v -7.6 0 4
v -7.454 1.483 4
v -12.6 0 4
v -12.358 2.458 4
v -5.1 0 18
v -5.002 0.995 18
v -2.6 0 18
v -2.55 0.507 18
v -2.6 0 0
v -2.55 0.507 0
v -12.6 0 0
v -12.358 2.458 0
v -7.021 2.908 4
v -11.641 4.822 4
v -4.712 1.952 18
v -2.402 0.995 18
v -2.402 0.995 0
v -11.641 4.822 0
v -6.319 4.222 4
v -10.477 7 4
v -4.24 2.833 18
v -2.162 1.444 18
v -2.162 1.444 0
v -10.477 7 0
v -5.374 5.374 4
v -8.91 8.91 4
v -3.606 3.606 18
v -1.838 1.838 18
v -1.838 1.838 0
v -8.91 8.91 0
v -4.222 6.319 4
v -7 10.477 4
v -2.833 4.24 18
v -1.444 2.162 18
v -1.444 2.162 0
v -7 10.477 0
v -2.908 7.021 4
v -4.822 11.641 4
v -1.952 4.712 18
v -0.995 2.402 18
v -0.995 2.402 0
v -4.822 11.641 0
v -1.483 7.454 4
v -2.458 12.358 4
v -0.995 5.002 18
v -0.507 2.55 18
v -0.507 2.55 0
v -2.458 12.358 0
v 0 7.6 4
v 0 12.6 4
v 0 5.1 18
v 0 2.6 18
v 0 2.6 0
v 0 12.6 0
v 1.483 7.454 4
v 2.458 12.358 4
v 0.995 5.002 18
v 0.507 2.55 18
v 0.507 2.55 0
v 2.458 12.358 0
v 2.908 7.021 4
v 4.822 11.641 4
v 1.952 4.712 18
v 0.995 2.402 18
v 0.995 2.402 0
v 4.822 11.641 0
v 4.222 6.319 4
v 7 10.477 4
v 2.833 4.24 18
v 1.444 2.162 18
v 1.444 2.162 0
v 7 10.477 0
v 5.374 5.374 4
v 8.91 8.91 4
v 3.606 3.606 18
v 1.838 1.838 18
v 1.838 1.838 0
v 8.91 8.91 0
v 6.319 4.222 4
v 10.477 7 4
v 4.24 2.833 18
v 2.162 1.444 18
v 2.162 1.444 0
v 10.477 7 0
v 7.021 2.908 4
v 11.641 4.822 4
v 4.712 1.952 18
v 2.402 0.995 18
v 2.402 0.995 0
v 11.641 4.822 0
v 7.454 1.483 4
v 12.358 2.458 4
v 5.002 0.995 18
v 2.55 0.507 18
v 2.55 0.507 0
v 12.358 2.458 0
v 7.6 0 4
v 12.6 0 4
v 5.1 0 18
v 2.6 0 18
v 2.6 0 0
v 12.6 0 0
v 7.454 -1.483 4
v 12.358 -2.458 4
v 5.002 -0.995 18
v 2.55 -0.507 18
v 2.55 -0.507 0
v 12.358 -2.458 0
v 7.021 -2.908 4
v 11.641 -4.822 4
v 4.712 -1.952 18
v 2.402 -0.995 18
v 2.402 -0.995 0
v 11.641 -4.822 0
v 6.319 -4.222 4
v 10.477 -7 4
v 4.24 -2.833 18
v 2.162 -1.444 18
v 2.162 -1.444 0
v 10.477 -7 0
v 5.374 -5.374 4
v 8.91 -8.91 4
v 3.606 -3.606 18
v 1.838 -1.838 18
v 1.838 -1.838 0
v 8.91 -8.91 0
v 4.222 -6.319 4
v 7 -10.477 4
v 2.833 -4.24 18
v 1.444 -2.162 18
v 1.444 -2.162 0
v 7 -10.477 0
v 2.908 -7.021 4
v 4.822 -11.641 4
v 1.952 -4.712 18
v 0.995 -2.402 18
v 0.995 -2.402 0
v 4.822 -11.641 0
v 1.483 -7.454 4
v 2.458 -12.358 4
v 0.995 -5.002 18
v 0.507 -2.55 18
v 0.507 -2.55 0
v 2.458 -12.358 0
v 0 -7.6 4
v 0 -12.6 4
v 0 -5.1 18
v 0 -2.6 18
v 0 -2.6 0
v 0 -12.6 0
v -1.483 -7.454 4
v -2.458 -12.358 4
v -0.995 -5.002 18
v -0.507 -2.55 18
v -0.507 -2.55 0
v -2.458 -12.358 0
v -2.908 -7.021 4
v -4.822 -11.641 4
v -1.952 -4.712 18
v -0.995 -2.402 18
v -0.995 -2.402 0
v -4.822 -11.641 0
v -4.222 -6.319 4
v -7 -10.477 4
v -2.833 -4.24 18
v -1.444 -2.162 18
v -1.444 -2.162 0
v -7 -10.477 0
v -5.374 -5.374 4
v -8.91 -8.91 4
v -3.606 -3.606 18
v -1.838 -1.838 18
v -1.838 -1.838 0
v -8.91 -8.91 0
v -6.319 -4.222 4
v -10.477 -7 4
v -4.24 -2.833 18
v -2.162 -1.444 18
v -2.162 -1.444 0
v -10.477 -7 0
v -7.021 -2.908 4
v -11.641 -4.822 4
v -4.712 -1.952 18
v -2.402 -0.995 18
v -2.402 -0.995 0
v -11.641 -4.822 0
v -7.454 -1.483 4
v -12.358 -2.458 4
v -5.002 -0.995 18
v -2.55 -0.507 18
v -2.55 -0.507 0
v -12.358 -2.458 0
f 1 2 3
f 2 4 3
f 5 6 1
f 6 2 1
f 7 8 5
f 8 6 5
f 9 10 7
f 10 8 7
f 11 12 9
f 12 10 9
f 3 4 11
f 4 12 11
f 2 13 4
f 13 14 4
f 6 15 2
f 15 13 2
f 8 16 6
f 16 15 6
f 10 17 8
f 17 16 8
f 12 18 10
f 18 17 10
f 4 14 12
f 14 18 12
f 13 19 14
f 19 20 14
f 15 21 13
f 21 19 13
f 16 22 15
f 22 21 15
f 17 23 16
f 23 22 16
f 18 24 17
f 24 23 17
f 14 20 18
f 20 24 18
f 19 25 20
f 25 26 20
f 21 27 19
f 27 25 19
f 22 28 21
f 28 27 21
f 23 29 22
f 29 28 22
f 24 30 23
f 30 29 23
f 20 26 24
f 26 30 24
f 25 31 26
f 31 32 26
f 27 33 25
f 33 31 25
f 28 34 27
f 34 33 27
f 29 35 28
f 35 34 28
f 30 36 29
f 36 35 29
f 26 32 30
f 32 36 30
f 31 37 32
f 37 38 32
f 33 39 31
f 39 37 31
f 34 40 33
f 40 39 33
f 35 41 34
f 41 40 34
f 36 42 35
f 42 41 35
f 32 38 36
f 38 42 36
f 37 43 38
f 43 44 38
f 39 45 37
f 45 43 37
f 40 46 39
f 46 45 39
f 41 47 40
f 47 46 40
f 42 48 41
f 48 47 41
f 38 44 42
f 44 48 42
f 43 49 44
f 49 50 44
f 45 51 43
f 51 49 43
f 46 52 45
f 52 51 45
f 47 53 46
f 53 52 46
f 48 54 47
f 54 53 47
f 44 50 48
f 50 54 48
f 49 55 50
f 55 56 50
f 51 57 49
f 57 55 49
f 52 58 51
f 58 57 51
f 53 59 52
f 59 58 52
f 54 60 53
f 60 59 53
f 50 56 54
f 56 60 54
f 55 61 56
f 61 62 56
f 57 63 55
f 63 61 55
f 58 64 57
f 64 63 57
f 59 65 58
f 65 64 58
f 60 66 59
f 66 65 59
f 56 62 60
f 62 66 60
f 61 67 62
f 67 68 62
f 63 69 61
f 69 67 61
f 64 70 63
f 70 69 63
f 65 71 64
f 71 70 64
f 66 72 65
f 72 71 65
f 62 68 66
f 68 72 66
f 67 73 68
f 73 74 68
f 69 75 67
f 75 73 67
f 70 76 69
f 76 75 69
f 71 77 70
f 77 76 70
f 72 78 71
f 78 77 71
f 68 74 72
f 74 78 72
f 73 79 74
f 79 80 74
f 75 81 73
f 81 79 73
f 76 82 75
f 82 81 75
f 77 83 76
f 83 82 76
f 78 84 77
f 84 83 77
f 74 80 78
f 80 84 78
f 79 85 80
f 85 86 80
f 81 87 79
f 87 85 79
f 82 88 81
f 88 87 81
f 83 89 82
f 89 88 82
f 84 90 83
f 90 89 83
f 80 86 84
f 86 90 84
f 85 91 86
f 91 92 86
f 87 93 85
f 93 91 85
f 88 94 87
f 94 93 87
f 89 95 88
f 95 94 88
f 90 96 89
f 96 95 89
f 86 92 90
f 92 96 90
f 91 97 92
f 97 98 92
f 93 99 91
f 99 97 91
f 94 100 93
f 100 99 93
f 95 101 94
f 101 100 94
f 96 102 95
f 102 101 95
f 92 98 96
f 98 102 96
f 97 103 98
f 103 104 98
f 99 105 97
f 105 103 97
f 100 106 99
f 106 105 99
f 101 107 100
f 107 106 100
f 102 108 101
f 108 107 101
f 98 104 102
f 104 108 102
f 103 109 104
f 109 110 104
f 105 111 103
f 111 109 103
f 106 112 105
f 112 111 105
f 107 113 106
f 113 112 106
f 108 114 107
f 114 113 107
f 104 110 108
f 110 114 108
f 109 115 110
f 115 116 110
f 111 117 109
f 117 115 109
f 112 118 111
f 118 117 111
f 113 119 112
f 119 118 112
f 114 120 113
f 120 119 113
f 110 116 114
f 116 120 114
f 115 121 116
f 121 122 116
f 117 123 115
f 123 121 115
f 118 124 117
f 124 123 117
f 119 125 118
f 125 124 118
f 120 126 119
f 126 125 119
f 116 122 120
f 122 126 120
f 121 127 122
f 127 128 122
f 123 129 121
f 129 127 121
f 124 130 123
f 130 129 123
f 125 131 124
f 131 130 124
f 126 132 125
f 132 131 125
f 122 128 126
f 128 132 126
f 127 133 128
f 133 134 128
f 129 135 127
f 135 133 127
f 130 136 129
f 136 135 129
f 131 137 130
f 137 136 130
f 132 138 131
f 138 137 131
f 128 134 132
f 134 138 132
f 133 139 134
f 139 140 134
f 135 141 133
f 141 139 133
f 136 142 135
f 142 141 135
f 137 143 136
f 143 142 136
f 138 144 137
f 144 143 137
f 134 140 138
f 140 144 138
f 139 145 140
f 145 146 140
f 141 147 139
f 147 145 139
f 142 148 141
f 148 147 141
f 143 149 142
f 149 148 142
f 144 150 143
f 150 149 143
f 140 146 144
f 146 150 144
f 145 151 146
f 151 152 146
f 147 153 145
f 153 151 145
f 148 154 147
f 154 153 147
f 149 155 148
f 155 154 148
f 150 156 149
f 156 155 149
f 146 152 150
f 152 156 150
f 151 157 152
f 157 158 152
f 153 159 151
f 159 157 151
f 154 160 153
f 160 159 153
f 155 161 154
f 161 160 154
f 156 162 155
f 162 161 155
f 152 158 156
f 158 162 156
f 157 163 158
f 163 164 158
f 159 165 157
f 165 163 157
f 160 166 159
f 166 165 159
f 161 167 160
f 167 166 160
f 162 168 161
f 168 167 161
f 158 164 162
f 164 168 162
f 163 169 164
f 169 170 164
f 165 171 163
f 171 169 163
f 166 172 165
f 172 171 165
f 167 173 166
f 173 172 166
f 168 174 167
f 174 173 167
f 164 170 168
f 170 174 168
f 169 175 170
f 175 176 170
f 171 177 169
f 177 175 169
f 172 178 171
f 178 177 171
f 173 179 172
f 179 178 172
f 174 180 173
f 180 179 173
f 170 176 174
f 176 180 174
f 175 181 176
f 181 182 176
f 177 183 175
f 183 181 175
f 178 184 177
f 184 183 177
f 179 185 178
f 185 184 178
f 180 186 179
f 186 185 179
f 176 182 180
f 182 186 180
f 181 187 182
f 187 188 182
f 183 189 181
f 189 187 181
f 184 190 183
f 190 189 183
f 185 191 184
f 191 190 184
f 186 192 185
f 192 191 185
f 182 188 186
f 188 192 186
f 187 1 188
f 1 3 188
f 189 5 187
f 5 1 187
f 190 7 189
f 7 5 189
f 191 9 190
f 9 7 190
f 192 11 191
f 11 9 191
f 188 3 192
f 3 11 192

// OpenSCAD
$fn = 32;

// ----------------------------------------------------------------------
// Profiled standoff: conical spacer, 18 mm long, bore 5.2 mm
// ----------------------------------------------------------------------

// --- parameters (mm) ---
revolve_angle = 360;      // full turn around the Z axis
profile_points = 6;       // points of the closed outline

profile = [[2.6, 0], [12.6, 0], [12.6, 4], [7.6, 4], [5.1, 18], [2.6, 18]];  // single closed polygon, 6 points, counter clockwise

// --- the one profile operation ---
rotate_extrude(angle = revolve_angle) polygon(points = profile);
